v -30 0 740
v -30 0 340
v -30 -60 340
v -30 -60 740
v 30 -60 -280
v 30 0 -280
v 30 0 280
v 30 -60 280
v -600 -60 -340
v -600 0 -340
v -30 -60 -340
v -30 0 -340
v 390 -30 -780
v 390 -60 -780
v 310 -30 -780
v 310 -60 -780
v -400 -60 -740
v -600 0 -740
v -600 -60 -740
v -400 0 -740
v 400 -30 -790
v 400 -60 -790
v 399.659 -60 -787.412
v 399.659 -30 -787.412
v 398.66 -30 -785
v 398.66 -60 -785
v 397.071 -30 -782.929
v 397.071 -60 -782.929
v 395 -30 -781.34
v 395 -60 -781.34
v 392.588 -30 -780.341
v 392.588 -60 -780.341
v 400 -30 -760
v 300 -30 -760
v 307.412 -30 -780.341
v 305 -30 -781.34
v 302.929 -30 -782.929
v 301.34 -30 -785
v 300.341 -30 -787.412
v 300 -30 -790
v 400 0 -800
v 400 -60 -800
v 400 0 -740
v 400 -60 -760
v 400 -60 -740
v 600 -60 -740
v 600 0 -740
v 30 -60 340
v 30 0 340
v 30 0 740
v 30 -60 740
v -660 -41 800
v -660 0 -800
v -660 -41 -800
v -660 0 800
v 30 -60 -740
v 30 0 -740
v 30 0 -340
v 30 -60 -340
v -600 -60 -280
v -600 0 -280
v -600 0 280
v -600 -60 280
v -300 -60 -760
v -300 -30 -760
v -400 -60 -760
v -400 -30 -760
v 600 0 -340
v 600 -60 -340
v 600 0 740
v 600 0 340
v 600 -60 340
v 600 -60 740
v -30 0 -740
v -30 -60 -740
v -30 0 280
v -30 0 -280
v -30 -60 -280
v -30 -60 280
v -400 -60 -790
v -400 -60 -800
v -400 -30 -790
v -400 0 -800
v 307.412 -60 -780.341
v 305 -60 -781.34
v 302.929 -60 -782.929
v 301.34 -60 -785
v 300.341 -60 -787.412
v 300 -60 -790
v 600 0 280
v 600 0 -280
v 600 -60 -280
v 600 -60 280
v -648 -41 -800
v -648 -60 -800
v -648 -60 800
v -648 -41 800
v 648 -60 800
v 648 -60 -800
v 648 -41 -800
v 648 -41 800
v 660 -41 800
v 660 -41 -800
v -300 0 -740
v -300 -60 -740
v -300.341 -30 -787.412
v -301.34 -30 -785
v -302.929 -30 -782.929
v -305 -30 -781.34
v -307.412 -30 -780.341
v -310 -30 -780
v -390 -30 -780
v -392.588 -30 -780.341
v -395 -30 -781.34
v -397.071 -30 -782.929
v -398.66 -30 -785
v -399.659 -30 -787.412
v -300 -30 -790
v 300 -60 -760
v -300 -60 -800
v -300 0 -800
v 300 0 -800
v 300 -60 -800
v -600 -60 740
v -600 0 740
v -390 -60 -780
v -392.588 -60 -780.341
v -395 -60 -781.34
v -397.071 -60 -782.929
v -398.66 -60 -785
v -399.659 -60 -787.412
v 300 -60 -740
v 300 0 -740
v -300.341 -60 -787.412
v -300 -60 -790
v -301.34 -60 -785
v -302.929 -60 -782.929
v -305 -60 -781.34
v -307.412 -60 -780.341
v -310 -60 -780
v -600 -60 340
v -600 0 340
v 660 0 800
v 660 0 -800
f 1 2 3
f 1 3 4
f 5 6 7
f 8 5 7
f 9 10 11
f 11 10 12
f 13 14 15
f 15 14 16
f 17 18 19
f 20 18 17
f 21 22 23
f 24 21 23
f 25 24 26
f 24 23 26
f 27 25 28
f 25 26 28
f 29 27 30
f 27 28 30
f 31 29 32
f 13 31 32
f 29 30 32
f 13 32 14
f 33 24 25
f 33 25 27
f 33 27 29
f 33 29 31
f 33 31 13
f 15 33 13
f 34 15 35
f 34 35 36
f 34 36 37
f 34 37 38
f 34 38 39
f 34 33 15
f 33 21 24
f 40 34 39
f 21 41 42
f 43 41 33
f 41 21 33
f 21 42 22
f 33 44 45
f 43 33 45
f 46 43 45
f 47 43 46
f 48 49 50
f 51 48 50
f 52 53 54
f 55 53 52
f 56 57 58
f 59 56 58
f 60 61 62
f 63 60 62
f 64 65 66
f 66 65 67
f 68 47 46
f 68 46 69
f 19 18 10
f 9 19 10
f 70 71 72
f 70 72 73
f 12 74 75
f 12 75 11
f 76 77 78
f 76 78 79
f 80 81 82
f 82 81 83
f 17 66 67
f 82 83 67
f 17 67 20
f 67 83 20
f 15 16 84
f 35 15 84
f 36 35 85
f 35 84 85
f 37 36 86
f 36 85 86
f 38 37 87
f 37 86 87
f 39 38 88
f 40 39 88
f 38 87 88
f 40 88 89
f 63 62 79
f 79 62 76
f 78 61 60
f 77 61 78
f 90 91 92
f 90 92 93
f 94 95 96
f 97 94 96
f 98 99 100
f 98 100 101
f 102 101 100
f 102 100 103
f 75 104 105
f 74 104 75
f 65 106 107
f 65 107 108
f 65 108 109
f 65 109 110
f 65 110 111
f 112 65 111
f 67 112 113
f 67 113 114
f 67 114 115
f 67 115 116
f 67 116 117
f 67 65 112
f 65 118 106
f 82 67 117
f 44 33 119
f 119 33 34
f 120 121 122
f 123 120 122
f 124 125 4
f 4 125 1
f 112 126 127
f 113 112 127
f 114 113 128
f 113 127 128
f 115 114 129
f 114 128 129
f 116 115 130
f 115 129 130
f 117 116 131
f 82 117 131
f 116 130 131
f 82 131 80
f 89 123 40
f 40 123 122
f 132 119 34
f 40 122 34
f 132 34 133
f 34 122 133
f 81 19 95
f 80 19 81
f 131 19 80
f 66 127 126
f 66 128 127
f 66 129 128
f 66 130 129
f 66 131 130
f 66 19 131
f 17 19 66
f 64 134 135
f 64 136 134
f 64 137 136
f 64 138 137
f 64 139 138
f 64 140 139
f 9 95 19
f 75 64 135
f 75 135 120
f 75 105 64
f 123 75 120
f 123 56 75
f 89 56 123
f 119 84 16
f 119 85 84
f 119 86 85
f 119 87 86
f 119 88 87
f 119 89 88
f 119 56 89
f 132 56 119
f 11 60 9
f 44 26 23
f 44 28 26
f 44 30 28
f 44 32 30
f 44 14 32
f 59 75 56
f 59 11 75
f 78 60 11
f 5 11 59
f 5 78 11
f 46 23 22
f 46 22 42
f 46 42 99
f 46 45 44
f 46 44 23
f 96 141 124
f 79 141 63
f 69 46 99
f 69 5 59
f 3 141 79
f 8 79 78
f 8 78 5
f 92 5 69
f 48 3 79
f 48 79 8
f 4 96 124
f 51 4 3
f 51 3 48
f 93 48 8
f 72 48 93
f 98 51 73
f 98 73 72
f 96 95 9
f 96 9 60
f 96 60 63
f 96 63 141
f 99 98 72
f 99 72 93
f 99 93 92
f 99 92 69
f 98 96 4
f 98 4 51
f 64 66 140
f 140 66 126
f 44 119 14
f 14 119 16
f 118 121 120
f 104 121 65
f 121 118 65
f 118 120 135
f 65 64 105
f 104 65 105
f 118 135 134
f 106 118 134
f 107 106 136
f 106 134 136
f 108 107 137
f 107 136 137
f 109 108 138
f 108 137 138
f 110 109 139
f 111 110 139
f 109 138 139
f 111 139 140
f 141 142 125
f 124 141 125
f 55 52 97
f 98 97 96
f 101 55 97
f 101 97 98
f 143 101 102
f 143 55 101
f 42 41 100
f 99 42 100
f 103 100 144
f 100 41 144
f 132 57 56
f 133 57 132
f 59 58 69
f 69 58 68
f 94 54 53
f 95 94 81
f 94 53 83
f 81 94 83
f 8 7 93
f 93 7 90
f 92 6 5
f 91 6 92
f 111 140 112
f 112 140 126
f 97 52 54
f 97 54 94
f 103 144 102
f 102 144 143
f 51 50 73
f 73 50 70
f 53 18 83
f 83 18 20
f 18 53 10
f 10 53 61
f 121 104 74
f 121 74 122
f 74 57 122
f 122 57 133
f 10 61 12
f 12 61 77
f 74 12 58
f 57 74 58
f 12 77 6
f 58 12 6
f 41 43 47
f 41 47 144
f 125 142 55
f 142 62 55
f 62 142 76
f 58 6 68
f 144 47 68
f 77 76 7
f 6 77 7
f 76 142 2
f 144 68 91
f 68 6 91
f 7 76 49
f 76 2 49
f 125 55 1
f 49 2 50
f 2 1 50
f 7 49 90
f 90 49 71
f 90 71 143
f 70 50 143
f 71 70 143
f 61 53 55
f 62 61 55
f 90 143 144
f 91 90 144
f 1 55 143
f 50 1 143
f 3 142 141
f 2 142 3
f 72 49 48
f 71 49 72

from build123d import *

# Parameters (mm, degrees)
F0_W      = 1320
F0_H      = 1600
F0_W_2    = 570
F0_H_2    = 400
F0_H_3    = 560
F1_DEPTH  = 60
F2_W      = 12
F2_H      = 1600
F3_DEPTH  = 19
F5_DEPTH  = 60
F6_W      = 100
F6_H      = 60
F7_DEPTH  = 30
F8_W      = 100
F8_H      = 20
F9_DEPTH  = 30
F10_W     = 100
F10_H     = 20
F11_DEPTH = 30


with BuildPart() as f1:
    # F0 (on Front) → F1 (new body)
    with BuildSketch(Plane.XZ):
        Rectangle(F0_W, F0_H)
        with Locations((-315, -540)):
            Rectangle(F0_W_2, F0_H_2, mode=Mode.SUBTRACT)
        with Locations((315, -540)):
            Rectangle(F0_W_2, F0_H_2, mode=Mode.SUBTRACT)
        with Locations((-315, 0)):
            Rectangle(F0_W_2, F0_H_3, mode=Mode.SUBTRACT)
        with Locations((-315, 540)):
            Rectangle(F0_W_2, F0_H_2, mode=Mode.SUBTRACT)
        with Locations((315, 0)):
            Rectangle(F0_W_2, F0_H_3, mode=Mode.SUBTRACT)
        with Locations((315, 540)):
            Rectangle(F0_W_2, F0_H_2, mode=Mode.SUBTRACT)
    extrude(amount=F1_DEPTH)

    # F2 (on face) → F3 (cut)
    with BuildSketch(Plane.XZ.offset(60)):
        with Locations((-654, 0)):
            Rectangle(F2_W, F2_H)
        with Locations((654, 0)):
            Rectangle(F2_W, F2_H)
    extrude(amount=-F3_DEPTH, mode=Mode.SUBTRACT)

    # F4 (on face) → F5 (cut)
    with BuildSketch(Plane.XZ.offset(60)):
        with BuildLine():
            Line((-400, -790), (-400, -800))
            Line((-400, -800), (-300, -800))
            Line((-300, -800), (-300, -790))
            ThreePointArc((-300, -790), (-302.928932, -782.928932), (-310, -780))
            Line((-310, -780), (-390, -780))
            ThreePointArc((-390, -780), (-397.071068, -782.928932), (-400, -790))
        make_face()
        with BuildLine():
            Line((300, -790), (300, -800))
            Line((300, -800), (400, -800))
            Line((400, -800), (400, -790))
            ThreePointArc((400, -790), (397.071068, -782.928932), (390, -780))
            Line((390, -780), (310, -780))
            ThreePointArc((310, -780), (302.928932, -782.928932), (300, -790))
        make_face()
    extrude(amount=-F5_DEPTH, mode=Mode.SUBTRACT)

    # F6 (on face) → F7 (cut)
    with BuildSketch(Plane(origin=(0, 0, 0), x_dir=(-1, 0, 0), z_dir=(0, 1, 0))):
        with Locations((-350, -770)):
            Rectangle(F6_W, F6_H)
        with Locations((350, -770)):
            Rectangle(F6_W, F6_H)
    extrude(amount=-F7_DEPTH, mode=Mode.SUBTRACT)

    # F8 (on face) → F9 (cut)
    with BuildSketch(Plane(origin=(0, -30, 0), x_dir=(-1, 0, 0), z_dir=(0, 1, 0))):
        with Locations((-350, -750)):
            Rectangle(F8_W, F8_H)
    extrude(amount=-F9_DEPTH, mode=Mode.SUBTRACT)

    # F10 (on face) → F11 (cut)
    with BuildSketch(Plane(origin=(0, -30, 0), x_dir=(-1, 0, 0), z_dir=(0, 1, 0))):
        with Locations((350, -750)):
            Rectangle(F10_W, F10_H)
    extrude(amount=-F11_DEPTH, mode=Mode.SUBTRACT)


solid = f1.part
